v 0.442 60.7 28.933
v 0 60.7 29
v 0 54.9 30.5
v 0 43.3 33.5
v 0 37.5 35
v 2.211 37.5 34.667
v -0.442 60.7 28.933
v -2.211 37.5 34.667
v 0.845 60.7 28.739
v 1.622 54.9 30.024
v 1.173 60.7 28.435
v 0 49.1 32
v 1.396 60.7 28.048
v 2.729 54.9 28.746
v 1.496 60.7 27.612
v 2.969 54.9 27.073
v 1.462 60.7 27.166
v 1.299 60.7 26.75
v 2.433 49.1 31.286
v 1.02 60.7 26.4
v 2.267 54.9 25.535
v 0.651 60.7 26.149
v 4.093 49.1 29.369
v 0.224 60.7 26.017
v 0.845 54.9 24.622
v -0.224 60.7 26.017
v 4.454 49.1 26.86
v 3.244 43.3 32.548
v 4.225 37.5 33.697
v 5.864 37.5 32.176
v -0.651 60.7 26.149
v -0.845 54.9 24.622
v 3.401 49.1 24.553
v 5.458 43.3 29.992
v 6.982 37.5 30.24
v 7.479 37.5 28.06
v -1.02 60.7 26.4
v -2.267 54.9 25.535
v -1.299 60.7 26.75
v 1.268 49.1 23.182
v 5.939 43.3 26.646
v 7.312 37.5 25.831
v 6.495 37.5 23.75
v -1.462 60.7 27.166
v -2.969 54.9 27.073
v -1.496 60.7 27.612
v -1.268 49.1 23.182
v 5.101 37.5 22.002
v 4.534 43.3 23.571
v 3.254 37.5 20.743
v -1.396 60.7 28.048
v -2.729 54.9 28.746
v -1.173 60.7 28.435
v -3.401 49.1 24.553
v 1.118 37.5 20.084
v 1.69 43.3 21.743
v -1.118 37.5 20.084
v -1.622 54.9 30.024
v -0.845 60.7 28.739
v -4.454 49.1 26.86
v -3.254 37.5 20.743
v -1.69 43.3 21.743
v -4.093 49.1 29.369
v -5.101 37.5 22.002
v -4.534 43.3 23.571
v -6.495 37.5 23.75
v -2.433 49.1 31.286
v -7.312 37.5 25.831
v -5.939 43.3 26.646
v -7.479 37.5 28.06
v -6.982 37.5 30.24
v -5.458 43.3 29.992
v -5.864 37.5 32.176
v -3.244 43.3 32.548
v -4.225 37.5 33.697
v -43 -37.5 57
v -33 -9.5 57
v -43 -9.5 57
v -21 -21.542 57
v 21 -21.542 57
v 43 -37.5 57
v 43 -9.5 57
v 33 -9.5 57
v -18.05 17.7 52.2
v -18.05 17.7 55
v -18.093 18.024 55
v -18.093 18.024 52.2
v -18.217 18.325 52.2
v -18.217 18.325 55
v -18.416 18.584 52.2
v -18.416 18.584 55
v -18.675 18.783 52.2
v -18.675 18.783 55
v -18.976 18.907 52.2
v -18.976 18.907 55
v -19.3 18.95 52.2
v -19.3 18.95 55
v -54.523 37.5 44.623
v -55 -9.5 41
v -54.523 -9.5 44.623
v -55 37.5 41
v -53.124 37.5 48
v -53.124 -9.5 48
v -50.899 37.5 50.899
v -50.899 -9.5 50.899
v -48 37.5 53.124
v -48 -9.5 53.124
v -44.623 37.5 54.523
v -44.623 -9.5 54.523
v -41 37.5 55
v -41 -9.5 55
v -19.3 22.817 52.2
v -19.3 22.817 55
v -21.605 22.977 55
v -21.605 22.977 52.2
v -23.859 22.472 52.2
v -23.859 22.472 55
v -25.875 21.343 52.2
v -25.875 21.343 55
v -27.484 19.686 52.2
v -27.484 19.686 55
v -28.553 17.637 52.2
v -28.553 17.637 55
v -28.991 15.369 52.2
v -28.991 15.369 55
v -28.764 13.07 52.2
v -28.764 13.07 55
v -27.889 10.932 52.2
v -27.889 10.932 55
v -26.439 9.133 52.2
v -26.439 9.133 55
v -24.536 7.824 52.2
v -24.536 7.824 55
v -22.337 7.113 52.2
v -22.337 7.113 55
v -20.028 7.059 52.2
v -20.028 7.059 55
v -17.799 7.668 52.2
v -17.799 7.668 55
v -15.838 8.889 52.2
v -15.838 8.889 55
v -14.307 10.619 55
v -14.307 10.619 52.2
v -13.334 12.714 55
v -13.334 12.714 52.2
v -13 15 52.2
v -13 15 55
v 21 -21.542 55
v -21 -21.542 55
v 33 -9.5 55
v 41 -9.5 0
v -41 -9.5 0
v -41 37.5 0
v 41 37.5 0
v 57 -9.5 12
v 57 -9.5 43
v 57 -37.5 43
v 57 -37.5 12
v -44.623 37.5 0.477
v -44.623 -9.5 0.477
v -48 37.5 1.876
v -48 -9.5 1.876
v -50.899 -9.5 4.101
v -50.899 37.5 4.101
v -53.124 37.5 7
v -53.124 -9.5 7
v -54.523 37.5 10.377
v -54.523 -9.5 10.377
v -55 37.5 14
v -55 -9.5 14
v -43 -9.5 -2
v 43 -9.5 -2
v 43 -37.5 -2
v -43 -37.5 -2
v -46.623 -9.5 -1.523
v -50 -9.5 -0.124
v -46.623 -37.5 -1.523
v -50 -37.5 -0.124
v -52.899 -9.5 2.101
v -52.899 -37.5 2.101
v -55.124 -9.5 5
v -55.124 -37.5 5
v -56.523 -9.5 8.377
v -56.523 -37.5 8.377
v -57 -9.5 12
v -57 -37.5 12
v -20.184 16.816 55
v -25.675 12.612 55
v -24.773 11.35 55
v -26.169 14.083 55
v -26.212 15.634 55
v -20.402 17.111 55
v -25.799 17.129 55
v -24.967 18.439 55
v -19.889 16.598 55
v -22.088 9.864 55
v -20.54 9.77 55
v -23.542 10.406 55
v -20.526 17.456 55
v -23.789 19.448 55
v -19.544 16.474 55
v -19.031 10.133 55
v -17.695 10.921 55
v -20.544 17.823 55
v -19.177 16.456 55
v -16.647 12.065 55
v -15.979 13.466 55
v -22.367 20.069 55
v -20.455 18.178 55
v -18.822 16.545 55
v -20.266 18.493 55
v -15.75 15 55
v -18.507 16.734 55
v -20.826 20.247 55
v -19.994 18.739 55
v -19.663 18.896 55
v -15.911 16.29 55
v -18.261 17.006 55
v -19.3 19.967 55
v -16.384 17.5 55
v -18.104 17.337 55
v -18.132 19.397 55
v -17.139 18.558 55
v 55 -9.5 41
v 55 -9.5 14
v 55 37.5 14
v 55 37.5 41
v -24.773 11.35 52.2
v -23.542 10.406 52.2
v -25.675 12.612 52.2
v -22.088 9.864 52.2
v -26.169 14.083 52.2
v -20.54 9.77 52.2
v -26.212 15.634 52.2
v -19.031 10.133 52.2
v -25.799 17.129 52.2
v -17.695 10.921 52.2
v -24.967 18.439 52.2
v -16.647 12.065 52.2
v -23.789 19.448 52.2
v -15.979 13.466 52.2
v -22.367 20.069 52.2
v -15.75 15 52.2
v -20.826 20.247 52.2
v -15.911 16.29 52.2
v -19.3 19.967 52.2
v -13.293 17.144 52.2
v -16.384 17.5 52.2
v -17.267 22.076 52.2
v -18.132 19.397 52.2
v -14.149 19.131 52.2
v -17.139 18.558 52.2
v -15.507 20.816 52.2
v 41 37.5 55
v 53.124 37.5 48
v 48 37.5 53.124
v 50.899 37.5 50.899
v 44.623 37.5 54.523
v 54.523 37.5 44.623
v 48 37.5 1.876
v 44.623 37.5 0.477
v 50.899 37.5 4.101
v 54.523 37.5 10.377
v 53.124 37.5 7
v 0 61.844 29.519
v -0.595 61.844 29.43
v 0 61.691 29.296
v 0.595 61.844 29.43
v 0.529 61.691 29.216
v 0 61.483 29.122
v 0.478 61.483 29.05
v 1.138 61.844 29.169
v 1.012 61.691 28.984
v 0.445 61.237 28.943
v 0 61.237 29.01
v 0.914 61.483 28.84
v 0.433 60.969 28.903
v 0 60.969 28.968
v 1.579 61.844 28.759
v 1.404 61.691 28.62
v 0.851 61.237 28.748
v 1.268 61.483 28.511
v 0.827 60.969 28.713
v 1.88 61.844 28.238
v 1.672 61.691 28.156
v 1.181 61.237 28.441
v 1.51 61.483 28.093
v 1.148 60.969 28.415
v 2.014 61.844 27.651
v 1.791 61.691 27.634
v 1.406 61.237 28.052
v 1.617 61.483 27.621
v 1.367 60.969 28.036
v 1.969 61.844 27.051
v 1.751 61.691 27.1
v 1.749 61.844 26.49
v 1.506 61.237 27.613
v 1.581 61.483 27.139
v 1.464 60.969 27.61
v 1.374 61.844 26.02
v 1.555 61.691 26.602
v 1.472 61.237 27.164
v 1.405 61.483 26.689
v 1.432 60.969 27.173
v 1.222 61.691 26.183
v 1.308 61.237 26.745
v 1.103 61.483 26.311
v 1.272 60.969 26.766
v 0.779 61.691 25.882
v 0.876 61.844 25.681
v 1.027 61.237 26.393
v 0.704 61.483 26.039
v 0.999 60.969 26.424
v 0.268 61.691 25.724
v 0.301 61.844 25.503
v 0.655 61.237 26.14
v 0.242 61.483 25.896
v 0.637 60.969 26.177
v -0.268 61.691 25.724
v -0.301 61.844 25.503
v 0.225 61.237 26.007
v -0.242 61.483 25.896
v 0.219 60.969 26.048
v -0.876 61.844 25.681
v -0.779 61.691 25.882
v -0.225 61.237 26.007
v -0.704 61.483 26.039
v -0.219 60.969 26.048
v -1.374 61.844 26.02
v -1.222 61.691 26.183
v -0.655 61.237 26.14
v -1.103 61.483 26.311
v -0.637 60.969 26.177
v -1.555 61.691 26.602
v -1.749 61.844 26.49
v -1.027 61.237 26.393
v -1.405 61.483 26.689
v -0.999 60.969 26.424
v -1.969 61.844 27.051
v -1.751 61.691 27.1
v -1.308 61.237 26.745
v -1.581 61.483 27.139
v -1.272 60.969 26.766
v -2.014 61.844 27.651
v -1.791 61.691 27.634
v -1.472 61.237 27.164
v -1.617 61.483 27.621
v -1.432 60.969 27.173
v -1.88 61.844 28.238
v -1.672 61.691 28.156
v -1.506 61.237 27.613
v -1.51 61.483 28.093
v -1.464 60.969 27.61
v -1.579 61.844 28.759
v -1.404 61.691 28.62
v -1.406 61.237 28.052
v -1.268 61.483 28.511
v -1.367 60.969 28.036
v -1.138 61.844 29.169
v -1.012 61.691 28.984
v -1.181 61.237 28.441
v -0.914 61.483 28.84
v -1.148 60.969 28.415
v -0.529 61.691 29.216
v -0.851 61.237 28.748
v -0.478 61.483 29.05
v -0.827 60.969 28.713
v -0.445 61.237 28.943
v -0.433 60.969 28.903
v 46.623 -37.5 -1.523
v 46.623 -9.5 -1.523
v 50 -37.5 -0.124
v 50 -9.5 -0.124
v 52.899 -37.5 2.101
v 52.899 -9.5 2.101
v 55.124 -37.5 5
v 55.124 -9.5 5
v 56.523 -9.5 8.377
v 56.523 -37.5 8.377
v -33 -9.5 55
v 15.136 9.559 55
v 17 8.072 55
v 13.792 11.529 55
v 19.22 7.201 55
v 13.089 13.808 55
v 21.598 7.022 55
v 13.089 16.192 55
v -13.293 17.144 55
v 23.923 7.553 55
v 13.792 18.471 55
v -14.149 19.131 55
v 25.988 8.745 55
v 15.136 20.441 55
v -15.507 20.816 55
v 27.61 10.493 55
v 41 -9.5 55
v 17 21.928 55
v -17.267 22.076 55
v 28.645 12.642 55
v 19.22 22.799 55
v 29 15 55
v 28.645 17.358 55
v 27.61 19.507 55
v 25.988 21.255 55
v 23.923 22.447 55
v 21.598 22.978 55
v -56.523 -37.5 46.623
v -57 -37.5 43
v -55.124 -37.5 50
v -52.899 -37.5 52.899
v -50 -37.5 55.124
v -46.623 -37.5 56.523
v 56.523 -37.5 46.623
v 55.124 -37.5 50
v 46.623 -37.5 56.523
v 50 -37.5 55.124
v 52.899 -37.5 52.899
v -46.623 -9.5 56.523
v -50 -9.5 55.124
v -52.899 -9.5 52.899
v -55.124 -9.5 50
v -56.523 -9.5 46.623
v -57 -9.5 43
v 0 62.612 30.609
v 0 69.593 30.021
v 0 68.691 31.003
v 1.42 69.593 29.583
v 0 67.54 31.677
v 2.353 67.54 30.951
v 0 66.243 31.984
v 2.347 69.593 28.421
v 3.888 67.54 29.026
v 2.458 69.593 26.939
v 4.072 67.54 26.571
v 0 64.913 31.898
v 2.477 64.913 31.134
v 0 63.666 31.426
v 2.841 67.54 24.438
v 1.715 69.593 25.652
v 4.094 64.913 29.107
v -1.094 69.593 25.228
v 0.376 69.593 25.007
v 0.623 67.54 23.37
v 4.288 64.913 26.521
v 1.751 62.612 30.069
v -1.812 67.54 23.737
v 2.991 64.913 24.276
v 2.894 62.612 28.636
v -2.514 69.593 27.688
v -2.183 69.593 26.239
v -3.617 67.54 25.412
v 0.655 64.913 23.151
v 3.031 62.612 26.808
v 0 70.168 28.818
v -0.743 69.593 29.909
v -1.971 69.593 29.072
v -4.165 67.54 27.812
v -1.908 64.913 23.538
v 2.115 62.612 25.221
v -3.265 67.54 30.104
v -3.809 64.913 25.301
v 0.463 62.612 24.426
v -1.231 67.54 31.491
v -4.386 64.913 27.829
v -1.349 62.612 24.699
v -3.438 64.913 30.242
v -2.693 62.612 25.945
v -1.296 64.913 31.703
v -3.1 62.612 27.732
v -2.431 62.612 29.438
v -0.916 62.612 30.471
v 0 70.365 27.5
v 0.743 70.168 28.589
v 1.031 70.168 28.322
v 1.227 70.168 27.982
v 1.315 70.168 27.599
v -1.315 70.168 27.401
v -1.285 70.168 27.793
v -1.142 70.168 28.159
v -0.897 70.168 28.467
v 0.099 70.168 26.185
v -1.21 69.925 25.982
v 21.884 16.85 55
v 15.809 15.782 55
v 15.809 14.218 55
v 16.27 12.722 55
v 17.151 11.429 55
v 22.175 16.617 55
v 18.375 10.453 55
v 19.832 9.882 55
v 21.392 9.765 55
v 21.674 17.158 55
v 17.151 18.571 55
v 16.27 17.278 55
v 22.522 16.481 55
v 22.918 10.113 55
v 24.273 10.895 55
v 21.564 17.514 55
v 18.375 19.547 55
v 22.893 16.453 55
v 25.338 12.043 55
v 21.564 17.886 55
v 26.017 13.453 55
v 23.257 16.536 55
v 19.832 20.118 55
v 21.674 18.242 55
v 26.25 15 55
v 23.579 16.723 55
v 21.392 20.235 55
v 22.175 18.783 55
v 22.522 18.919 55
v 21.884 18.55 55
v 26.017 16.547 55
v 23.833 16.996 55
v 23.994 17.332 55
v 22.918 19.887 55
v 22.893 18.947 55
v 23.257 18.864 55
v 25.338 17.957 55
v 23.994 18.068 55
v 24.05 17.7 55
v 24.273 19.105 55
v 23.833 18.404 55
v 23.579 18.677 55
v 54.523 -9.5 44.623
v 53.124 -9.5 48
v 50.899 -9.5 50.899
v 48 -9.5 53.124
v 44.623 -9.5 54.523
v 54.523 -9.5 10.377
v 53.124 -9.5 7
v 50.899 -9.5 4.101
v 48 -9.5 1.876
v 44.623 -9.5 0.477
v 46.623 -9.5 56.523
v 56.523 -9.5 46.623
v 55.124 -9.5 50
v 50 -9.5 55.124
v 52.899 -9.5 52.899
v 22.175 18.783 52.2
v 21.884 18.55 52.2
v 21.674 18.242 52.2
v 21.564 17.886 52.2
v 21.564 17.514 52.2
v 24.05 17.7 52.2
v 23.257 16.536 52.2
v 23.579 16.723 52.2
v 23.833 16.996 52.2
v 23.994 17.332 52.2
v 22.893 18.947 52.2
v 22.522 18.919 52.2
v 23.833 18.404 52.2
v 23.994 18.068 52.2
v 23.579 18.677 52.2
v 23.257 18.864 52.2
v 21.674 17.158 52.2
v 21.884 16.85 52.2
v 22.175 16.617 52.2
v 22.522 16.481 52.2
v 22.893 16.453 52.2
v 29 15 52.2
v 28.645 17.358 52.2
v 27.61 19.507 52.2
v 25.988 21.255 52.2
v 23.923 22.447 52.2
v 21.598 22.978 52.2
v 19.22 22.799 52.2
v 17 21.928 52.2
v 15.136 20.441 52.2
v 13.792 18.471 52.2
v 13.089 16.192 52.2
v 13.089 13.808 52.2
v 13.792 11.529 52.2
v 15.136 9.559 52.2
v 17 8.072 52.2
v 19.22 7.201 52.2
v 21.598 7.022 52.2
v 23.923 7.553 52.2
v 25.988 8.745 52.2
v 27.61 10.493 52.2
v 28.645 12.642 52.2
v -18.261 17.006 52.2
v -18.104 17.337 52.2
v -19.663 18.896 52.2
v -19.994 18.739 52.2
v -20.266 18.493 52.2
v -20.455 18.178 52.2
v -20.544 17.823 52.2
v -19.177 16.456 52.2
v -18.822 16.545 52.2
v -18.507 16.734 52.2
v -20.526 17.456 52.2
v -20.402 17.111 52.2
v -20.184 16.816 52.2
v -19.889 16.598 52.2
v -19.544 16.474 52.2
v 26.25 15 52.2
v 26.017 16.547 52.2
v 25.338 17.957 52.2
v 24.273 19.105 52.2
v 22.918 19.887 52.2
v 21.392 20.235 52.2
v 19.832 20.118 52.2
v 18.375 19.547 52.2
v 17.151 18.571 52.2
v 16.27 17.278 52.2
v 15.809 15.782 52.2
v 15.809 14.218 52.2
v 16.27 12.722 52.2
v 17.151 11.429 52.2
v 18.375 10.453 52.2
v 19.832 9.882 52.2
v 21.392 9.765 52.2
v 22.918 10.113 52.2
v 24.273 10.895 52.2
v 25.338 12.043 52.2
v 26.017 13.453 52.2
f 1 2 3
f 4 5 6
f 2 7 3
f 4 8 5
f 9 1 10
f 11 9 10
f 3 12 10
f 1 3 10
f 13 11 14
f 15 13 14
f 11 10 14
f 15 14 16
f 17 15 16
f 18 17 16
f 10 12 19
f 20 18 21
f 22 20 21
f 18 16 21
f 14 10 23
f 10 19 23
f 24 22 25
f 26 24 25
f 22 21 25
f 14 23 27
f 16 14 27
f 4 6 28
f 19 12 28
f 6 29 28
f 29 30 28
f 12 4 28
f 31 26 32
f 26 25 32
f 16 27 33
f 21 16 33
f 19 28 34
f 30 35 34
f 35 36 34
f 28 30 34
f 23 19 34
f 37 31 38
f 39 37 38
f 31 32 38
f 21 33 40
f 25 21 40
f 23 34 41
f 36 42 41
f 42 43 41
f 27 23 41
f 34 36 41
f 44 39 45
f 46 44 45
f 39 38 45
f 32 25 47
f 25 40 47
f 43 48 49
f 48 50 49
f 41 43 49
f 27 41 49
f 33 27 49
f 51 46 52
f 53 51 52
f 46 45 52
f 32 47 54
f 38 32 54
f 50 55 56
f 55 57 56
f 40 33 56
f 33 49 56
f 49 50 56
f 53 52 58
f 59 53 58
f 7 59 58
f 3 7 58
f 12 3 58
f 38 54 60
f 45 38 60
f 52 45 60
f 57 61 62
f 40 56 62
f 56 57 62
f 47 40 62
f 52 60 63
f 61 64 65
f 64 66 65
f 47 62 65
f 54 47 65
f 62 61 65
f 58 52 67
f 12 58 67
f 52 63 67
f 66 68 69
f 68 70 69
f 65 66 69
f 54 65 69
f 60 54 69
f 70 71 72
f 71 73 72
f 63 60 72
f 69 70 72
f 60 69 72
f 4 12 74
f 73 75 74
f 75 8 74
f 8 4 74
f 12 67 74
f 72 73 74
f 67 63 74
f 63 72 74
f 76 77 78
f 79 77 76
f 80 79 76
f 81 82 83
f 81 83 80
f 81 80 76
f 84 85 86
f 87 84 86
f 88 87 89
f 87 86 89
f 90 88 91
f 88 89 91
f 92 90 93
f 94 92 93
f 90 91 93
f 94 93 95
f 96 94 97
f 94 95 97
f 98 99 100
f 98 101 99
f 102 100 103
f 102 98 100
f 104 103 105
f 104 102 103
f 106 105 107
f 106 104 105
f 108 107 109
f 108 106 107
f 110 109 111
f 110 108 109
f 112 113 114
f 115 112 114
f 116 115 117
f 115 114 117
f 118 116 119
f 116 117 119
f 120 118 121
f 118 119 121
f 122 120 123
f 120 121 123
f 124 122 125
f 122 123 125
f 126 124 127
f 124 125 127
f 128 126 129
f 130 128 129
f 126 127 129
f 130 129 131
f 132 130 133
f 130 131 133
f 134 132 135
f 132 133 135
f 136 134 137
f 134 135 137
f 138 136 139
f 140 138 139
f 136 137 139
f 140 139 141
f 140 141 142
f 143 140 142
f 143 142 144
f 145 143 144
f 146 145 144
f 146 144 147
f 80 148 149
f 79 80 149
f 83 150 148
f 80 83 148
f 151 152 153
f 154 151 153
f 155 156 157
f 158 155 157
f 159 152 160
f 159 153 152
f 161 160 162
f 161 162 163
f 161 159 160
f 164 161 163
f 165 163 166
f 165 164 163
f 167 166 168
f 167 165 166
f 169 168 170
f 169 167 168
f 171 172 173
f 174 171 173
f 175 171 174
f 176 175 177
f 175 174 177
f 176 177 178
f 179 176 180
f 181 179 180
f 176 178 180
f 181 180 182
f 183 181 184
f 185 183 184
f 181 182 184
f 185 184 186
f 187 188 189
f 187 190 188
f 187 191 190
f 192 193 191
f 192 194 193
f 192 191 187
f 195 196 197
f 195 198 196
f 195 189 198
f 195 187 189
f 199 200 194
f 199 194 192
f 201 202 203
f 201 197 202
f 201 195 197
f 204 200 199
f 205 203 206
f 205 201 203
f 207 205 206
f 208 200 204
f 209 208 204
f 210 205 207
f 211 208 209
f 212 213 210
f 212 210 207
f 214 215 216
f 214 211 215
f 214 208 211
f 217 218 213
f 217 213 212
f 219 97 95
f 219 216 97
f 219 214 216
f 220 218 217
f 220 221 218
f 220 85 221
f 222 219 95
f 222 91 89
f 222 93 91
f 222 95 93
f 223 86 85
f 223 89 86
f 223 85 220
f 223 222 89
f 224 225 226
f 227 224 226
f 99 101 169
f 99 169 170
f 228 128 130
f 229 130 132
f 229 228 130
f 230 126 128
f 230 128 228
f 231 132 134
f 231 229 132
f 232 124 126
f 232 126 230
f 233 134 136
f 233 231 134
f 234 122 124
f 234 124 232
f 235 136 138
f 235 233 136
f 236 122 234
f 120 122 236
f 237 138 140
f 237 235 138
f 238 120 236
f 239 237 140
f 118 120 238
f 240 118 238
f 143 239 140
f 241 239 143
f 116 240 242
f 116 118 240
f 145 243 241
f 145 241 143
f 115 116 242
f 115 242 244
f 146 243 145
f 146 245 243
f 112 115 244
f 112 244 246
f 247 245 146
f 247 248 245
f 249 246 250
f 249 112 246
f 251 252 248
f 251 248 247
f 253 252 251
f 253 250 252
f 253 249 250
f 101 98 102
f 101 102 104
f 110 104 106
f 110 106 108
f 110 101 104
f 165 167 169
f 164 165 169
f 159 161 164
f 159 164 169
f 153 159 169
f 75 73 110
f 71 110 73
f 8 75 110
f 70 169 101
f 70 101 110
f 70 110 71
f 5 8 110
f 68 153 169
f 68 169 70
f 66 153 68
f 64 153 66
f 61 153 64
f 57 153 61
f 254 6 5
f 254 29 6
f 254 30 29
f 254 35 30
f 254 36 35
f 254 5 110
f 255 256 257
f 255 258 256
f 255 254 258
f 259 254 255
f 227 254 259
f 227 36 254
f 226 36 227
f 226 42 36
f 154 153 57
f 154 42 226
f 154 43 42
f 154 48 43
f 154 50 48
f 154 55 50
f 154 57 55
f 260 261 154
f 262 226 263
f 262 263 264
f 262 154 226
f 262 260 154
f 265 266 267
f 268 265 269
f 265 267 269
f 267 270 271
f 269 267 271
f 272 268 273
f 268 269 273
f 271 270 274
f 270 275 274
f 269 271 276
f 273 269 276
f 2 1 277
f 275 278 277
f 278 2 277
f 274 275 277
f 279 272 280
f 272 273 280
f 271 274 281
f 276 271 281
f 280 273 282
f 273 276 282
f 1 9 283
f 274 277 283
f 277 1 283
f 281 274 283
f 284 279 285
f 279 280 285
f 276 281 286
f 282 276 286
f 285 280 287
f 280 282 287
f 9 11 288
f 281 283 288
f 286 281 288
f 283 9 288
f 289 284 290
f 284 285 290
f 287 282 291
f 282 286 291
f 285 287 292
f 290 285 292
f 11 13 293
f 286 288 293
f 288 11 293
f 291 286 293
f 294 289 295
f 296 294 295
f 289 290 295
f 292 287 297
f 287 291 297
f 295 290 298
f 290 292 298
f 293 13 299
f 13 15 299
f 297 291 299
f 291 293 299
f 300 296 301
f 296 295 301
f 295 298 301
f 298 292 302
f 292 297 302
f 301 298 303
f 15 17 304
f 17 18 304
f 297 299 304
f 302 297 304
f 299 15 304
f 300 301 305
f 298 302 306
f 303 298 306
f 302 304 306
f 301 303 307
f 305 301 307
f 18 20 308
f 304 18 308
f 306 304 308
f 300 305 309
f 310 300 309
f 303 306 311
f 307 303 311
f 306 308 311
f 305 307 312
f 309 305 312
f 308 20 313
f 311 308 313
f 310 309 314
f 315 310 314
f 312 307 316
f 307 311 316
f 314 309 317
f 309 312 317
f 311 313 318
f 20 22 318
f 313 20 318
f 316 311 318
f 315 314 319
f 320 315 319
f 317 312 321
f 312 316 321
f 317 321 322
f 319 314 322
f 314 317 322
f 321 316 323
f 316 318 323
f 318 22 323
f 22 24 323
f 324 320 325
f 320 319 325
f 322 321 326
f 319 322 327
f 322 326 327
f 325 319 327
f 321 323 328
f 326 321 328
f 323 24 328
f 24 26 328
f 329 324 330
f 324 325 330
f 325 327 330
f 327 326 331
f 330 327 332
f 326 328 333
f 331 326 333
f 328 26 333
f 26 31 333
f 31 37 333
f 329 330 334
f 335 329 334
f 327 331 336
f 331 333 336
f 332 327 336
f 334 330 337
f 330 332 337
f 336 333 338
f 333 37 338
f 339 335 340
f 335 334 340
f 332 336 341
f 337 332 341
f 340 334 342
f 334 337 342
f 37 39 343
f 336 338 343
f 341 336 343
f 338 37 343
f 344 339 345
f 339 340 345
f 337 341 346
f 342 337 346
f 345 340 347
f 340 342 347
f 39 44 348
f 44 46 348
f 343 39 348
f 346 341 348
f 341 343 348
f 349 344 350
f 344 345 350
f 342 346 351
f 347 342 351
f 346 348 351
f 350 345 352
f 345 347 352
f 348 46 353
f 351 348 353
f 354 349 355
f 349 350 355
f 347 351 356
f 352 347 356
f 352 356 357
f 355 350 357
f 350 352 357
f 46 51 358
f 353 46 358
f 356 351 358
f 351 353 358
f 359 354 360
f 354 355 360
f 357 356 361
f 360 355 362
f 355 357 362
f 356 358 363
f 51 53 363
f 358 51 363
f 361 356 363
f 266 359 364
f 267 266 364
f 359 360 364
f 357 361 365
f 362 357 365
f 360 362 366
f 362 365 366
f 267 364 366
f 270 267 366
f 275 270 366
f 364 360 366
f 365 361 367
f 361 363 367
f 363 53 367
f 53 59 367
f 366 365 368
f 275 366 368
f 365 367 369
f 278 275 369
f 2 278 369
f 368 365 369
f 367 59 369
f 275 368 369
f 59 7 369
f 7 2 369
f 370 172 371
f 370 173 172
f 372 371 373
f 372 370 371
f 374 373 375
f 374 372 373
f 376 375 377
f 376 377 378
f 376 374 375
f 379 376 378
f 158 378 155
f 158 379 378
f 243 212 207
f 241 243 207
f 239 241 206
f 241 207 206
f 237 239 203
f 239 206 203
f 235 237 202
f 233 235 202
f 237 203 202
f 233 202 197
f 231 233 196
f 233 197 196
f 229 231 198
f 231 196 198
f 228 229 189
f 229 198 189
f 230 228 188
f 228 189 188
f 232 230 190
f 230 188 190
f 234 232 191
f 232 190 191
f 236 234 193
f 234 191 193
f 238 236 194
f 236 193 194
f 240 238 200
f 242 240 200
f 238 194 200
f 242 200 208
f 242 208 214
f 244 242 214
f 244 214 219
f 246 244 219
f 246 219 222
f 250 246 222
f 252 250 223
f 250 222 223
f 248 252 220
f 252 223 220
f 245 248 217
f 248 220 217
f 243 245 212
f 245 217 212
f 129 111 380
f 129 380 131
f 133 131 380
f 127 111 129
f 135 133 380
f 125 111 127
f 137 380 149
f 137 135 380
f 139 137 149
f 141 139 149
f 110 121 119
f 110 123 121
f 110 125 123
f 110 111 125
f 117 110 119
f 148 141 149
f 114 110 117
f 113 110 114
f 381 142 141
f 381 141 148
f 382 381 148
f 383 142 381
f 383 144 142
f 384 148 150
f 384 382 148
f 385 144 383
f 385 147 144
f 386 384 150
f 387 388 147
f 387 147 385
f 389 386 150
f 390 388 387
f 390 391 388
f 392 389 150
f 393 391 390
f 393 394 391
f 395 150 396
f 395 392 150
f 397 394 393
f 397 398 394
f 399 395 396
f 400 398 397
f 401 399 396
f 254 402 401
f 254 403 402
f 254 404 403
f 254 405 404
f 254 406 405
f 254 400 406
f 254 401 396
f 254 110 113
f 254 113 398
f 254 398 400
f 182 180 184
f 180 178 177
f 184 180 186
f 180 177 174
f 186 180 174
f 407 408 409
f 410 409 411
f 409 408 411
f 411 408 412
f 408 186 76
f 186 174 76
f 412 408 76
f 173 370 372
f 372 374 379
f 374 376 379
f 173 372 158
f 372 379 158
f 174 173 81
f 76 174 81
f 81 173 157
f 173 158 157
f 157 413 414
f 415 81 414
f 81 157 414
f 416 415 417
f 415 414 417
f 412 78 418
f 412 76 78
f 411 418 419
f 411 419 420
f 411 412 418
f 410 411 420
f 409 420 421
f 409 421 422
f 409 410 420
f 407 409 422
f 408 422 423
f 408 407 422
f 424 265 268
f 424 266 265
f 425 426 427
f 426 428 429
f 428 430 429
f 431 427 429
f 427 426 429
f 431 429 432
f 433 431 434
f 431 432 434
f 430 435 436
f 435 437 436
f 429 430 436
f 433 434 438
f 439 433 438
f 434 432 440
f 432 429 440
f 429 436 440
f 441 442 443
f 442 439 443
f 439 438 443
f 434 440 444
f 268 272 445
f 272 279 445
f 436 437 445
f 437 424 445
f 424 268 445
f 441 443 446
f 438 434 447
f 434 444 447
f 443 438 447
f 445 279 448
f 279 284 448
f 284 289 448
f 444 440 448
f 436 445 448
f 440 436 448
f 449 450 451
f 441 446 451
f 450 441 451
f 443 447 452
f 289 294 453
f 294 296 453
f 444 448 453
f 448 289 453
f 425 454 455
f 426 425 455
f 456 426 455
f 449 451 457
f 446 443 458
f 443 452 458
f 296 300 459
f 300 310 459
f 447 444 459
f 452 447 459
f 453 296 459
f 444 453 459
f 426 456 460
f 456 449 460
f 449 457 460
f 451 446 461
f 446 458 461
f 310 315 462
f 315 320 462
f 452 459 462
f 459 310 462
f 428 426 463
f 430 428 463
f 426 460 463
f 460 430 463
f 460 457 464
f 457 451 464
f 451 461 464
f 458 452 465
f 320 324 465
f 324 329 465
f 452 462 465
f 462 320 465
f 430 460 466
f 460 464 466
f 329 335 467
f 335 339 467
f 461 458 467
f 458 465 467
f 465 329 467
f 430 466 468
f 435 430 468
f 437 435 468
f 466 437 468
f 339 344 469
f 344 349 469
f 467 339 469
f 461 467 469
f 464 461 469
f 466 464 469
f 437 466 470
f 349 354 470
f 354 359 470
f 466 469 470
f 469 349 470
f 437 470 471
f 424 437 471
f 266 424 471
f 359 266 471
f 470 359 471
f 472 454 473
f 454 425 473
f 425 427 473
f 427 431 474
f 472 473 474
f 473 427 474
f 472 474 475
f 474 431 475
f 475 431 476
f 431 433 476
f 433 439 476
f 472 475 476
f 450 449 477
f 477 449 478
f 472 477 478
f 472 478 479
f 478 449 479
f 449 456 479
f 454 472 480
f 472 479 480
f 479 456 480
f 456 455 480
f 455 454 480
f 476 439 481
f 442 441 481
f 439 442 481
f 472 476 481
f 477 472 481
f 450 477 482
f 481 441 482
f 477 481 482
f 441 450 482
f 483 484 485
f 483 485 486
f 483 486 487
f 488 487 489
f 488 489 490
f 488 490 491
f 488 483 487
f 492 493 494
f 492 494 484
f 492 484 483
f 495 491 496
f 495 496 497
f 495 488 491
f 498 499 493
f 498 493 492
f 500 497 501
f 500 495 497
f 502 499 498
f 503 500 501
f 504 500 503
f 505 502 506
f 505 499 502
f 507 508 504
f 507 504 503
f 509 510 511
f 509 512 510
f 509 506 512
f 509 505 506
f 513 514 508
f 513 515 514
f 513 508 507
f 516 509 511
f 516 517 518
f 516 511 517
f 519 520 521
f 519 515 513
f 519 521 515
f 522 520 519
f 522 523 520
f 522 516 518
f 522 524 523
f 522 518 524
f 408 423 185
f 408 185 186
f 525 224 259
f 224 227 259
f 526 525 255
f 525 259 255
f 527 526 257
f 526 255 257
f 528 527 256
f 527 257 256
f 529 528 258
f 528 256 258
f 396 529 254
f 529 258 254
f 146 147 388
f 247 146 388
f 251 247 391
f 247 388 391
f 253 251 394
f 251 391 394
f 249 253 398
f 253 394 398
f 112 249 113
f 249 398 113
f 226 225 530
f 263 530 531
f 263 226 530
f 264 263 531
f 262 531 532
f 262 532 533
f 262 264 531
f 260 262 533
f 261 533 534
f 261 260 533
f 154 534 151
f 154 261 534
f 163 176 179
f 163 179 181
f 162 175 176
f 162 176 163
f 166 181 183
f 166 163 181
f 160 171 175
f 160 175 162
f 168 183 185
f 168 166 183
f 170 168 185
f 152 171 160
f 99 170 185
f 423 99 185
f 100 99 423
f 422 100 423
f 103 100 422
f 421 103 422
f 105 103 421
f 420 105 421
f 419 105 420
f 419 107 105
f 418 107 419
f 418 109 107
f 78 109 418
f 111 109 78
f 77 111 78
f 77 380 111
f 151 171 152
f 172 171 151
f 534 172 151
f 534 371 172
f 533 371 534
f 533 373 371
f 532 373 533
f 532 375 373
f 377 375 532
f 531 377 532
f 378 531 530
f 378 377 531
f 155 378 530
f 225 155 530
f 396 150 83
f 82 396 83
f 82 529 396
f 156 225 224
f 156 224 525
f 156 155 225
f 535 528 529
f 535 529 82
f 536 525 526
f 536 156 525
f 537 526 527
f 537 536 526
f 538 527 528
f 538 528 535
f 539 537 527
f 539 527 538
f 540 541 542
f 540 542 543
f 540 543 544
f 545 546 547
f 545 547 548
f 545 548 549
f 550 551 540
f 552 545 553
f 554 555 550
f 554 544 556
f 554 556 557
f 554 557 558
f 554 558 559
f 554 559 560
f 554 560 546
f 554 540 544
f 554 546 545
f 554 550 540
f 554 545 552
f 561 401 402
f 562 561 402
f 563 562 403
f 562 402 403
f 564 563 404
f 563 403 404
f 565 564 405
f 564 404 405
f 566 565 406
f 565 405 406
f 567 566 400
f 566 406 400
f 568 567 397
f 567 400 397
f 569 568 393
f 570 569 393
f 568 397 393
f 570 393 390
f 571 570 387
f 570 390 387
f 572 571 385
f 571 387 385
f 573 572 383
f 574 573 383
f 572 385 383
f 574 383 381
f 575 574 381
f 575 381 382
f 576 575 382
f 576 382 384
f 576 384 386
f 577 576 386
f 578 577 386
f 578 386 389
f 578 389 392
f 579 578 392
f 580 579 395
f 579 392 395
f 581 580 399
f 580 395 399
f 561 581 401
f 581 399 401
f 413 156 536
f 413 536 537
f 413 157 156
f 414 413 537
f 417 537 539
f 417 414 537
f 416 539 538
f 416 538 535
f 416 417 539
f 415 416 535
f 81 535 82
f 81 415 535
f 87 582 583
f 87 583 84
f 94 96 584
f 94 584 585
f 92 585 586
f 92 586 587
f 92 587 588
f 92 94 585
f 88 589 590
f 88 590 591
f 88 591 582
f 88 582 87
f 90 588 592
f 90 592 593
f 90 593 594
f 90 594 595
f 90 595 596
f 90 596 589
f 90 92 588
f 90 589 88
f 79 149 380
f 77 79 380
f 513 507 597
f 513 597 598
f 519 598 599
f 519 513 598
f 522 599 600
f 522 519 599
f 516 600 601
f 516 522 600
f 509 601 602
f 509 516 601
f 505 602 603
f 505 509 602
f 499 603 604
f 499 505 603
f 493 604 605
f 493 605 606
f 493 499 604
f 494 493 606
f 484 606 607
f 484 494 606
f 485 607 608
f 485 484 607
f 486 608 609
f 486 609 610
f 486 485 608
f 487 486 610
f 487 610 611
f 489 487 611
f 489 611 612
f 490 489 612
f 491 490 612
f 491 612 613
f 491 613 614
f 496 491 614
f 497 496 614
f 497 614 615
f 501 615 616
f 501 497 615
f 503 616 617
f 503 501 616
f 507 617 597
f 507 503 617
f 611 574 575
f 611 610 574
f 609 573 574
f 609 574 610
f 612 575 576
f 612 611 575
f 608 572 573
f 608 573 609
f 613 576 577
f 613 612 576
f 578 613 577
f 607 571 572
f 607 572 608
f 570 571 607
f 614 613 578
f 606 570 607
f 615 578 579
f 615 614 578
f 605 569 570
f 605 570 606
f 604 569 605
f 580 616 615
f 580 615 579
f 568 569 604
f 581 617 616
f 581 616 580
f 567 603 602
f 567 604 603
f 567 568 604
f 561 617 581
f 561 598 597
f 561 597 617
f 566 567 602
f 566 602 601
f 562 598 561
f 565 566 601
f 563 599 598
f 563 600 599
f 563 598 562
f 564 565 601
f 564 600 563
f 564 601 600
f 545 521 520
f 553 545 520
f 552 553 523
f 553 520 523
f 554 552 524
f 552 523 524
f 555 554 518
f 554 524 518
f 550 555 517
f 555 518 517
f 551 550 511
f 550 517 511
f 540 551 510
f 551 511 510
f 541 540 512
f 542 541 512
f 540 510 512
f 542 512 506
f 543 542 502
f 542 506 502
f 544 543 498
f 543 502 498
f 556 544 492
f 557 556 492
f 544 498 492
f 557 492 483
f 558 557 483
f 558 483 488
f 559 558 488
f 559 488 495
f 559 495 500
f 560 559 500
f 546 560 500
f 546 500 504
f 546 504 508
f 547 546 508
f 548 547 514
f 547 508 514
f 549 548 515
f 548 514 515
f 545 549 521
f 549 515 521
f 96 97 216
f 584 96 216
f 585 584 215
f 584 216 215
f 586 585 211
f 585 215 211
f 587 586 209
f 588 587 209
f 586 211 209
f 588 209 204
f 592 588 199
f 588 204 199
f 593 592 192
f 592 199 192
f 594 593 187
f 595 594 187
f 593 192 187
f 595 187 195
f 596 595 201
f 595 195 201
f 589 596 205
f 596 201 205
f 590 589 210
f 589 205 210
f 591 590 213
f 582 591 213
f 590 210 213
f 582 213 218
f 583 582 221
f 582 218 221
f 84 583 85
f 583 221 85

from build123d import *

# Parameters (mm, degrees)
F0_W      = 110
F0_H      = 75
F1_DEPTH  = 55
F3_DEPTH  = 2
F5_DEPTH  = 2
F6_W      = 112
F6_H      = 28
F7_DEPTH  = 2
F8_W      = 28
F8_H      = 59
F9_DEPTH  = 2
F10_R     = 14
F11_R     = 8
F11_R_2   = 5.25
F11_R_3   = 1.25
F12_DEPTH = 2.8


with BuildPart() as f1:
    # F0 (on Top) → F1 (new body)
    with BuildSketch(Plane.XY):
        Rectangle(F0_W, F0_H)
    extrude(amount=F1_DEPTH)

    # F2 (on face) → F3 (join)
    with BuildSketch(Plane.XY.offset(55)):
        Polygon((0, -21.541595), (0, -37.5), (55, -37.5), (55, -9.5), (33, -9.5), (21, -21.541595), align=None)
        Polygon((-33, -9.5), (-55, -9.5), (-55, -37.5), (0, -37.5), (0, -21.541595), (-21, -21.541595), align=None)
    extrude(amount=F3_DEPTH)

    # F4 (on face) → F5 (join)
    with BuildSketch(Plane.YZ.offset(55)):
        Polygon((-9.5, 0), (-9.5, 55), (-9.5, 57), (-37.5, 57), (-37.5, 0), align=None)
    extrude(amount=F5_DEPTH)

    # F6 (on face) → F7 (join)
    with BuildSketch(Plane(origin=(0, 0, 0), x_dir=(1, 0, 0), z_dir=(0, 0, -1))):
        with Locations((1, 23.5)):
            Rectangle(F6_W, F6_H)
    extrude(amount=F7_DEPTH)

    # F8 (on face) → F9 (join)
    with BuildSketch(Plane(origin=(-55, 0, 0), x_dir=(0, -1, 0), z_dir=(-1, 0, 0))):
        with Locations((23.5, 27.5)):
            Rectangle(F8_W, F8_H)
    extrude(amount=F9_DEPTH)

    # F10
    f10_edges = [f1.edges().sort_by_distance(p)[0] for p in [
        (-57, -23.5, 57),
        (-55, 14, 55),
        (57, -23.5, 57),
        (55, 14, 55),
        (57, -23.5, -2),
        (55, 14, 0),
        (-55, 14, 0),
        (-57, -23.5, -2),
    ]]
    fillet(f10_edges, radius=F10_R)

    # F11 (on face) → F12 (cut)
    with BuildSketch(Plane.XY.offset(55)):
        with BuildLine():
            ThreePointArc((-19.3, 22.817289), (-27.228965, 9.98004), (-13, 15))
            ThreePointArc((-13, 15), (-14.771035, 20.01996), (-19.3, 22.817289))
        make_face()
        with BuildLine():
            ThreePointArc((-15.75, 15), (-25.27127, 11.947337), (-19.3, 19.967142))
            ThreePointArc((-19.3, 19.967142), (-16.72873, 18.052663), (-15.75, 15))
        make_face(mode=Mode.SUBTRACT)
        with BuildLine():
            ThreePointArc((-18.05, 17.7), (-18.416117, 18.583883), (-19.3, 18.95))
            ThreePointArc((-19.3, 18.95), (-20.183883, 16.816117), (-18.05, 17.7))
        make_face()
        with Locations((21, 15)):
            Circle(F11_R)
        with Locations((21, 15)):
            Circle(F11_R_2, mode=Mode.SUBTRACT)
        with Locations((22.8, 17.7)):
            Circle(F11_R_3)
    extrude(amount=-F12_DEPTH, mode=Mode.SUBTRACT)

    # F13 (on Right) → F14 (revolve)
    with BuildSketch(Plane.YZ):
        with BuildLine():
            Line((37.5, 35), (37.5, 27.5))
            Line((37.5, 27.5), (61.365487, 27.5))
            Line((61.365487, 27.5), (66.5, 27.5))
            Line((66.5, 27.5), (70.365487, 27.5))
            ThreePointArc((70.365487, 27.5), (66.903148, 31.878728), (61.844038, 29.519393))
            ThreePointArc((61.844038, 29.519393), (61.363774, 29.057593), (60.7, 29))
            Line((60.7, 29), (37.5, 35))
        make_face()
    revolve(axis=Axis((0, 52, 27.5), (0, 1, 0)))


solid = f1.part
